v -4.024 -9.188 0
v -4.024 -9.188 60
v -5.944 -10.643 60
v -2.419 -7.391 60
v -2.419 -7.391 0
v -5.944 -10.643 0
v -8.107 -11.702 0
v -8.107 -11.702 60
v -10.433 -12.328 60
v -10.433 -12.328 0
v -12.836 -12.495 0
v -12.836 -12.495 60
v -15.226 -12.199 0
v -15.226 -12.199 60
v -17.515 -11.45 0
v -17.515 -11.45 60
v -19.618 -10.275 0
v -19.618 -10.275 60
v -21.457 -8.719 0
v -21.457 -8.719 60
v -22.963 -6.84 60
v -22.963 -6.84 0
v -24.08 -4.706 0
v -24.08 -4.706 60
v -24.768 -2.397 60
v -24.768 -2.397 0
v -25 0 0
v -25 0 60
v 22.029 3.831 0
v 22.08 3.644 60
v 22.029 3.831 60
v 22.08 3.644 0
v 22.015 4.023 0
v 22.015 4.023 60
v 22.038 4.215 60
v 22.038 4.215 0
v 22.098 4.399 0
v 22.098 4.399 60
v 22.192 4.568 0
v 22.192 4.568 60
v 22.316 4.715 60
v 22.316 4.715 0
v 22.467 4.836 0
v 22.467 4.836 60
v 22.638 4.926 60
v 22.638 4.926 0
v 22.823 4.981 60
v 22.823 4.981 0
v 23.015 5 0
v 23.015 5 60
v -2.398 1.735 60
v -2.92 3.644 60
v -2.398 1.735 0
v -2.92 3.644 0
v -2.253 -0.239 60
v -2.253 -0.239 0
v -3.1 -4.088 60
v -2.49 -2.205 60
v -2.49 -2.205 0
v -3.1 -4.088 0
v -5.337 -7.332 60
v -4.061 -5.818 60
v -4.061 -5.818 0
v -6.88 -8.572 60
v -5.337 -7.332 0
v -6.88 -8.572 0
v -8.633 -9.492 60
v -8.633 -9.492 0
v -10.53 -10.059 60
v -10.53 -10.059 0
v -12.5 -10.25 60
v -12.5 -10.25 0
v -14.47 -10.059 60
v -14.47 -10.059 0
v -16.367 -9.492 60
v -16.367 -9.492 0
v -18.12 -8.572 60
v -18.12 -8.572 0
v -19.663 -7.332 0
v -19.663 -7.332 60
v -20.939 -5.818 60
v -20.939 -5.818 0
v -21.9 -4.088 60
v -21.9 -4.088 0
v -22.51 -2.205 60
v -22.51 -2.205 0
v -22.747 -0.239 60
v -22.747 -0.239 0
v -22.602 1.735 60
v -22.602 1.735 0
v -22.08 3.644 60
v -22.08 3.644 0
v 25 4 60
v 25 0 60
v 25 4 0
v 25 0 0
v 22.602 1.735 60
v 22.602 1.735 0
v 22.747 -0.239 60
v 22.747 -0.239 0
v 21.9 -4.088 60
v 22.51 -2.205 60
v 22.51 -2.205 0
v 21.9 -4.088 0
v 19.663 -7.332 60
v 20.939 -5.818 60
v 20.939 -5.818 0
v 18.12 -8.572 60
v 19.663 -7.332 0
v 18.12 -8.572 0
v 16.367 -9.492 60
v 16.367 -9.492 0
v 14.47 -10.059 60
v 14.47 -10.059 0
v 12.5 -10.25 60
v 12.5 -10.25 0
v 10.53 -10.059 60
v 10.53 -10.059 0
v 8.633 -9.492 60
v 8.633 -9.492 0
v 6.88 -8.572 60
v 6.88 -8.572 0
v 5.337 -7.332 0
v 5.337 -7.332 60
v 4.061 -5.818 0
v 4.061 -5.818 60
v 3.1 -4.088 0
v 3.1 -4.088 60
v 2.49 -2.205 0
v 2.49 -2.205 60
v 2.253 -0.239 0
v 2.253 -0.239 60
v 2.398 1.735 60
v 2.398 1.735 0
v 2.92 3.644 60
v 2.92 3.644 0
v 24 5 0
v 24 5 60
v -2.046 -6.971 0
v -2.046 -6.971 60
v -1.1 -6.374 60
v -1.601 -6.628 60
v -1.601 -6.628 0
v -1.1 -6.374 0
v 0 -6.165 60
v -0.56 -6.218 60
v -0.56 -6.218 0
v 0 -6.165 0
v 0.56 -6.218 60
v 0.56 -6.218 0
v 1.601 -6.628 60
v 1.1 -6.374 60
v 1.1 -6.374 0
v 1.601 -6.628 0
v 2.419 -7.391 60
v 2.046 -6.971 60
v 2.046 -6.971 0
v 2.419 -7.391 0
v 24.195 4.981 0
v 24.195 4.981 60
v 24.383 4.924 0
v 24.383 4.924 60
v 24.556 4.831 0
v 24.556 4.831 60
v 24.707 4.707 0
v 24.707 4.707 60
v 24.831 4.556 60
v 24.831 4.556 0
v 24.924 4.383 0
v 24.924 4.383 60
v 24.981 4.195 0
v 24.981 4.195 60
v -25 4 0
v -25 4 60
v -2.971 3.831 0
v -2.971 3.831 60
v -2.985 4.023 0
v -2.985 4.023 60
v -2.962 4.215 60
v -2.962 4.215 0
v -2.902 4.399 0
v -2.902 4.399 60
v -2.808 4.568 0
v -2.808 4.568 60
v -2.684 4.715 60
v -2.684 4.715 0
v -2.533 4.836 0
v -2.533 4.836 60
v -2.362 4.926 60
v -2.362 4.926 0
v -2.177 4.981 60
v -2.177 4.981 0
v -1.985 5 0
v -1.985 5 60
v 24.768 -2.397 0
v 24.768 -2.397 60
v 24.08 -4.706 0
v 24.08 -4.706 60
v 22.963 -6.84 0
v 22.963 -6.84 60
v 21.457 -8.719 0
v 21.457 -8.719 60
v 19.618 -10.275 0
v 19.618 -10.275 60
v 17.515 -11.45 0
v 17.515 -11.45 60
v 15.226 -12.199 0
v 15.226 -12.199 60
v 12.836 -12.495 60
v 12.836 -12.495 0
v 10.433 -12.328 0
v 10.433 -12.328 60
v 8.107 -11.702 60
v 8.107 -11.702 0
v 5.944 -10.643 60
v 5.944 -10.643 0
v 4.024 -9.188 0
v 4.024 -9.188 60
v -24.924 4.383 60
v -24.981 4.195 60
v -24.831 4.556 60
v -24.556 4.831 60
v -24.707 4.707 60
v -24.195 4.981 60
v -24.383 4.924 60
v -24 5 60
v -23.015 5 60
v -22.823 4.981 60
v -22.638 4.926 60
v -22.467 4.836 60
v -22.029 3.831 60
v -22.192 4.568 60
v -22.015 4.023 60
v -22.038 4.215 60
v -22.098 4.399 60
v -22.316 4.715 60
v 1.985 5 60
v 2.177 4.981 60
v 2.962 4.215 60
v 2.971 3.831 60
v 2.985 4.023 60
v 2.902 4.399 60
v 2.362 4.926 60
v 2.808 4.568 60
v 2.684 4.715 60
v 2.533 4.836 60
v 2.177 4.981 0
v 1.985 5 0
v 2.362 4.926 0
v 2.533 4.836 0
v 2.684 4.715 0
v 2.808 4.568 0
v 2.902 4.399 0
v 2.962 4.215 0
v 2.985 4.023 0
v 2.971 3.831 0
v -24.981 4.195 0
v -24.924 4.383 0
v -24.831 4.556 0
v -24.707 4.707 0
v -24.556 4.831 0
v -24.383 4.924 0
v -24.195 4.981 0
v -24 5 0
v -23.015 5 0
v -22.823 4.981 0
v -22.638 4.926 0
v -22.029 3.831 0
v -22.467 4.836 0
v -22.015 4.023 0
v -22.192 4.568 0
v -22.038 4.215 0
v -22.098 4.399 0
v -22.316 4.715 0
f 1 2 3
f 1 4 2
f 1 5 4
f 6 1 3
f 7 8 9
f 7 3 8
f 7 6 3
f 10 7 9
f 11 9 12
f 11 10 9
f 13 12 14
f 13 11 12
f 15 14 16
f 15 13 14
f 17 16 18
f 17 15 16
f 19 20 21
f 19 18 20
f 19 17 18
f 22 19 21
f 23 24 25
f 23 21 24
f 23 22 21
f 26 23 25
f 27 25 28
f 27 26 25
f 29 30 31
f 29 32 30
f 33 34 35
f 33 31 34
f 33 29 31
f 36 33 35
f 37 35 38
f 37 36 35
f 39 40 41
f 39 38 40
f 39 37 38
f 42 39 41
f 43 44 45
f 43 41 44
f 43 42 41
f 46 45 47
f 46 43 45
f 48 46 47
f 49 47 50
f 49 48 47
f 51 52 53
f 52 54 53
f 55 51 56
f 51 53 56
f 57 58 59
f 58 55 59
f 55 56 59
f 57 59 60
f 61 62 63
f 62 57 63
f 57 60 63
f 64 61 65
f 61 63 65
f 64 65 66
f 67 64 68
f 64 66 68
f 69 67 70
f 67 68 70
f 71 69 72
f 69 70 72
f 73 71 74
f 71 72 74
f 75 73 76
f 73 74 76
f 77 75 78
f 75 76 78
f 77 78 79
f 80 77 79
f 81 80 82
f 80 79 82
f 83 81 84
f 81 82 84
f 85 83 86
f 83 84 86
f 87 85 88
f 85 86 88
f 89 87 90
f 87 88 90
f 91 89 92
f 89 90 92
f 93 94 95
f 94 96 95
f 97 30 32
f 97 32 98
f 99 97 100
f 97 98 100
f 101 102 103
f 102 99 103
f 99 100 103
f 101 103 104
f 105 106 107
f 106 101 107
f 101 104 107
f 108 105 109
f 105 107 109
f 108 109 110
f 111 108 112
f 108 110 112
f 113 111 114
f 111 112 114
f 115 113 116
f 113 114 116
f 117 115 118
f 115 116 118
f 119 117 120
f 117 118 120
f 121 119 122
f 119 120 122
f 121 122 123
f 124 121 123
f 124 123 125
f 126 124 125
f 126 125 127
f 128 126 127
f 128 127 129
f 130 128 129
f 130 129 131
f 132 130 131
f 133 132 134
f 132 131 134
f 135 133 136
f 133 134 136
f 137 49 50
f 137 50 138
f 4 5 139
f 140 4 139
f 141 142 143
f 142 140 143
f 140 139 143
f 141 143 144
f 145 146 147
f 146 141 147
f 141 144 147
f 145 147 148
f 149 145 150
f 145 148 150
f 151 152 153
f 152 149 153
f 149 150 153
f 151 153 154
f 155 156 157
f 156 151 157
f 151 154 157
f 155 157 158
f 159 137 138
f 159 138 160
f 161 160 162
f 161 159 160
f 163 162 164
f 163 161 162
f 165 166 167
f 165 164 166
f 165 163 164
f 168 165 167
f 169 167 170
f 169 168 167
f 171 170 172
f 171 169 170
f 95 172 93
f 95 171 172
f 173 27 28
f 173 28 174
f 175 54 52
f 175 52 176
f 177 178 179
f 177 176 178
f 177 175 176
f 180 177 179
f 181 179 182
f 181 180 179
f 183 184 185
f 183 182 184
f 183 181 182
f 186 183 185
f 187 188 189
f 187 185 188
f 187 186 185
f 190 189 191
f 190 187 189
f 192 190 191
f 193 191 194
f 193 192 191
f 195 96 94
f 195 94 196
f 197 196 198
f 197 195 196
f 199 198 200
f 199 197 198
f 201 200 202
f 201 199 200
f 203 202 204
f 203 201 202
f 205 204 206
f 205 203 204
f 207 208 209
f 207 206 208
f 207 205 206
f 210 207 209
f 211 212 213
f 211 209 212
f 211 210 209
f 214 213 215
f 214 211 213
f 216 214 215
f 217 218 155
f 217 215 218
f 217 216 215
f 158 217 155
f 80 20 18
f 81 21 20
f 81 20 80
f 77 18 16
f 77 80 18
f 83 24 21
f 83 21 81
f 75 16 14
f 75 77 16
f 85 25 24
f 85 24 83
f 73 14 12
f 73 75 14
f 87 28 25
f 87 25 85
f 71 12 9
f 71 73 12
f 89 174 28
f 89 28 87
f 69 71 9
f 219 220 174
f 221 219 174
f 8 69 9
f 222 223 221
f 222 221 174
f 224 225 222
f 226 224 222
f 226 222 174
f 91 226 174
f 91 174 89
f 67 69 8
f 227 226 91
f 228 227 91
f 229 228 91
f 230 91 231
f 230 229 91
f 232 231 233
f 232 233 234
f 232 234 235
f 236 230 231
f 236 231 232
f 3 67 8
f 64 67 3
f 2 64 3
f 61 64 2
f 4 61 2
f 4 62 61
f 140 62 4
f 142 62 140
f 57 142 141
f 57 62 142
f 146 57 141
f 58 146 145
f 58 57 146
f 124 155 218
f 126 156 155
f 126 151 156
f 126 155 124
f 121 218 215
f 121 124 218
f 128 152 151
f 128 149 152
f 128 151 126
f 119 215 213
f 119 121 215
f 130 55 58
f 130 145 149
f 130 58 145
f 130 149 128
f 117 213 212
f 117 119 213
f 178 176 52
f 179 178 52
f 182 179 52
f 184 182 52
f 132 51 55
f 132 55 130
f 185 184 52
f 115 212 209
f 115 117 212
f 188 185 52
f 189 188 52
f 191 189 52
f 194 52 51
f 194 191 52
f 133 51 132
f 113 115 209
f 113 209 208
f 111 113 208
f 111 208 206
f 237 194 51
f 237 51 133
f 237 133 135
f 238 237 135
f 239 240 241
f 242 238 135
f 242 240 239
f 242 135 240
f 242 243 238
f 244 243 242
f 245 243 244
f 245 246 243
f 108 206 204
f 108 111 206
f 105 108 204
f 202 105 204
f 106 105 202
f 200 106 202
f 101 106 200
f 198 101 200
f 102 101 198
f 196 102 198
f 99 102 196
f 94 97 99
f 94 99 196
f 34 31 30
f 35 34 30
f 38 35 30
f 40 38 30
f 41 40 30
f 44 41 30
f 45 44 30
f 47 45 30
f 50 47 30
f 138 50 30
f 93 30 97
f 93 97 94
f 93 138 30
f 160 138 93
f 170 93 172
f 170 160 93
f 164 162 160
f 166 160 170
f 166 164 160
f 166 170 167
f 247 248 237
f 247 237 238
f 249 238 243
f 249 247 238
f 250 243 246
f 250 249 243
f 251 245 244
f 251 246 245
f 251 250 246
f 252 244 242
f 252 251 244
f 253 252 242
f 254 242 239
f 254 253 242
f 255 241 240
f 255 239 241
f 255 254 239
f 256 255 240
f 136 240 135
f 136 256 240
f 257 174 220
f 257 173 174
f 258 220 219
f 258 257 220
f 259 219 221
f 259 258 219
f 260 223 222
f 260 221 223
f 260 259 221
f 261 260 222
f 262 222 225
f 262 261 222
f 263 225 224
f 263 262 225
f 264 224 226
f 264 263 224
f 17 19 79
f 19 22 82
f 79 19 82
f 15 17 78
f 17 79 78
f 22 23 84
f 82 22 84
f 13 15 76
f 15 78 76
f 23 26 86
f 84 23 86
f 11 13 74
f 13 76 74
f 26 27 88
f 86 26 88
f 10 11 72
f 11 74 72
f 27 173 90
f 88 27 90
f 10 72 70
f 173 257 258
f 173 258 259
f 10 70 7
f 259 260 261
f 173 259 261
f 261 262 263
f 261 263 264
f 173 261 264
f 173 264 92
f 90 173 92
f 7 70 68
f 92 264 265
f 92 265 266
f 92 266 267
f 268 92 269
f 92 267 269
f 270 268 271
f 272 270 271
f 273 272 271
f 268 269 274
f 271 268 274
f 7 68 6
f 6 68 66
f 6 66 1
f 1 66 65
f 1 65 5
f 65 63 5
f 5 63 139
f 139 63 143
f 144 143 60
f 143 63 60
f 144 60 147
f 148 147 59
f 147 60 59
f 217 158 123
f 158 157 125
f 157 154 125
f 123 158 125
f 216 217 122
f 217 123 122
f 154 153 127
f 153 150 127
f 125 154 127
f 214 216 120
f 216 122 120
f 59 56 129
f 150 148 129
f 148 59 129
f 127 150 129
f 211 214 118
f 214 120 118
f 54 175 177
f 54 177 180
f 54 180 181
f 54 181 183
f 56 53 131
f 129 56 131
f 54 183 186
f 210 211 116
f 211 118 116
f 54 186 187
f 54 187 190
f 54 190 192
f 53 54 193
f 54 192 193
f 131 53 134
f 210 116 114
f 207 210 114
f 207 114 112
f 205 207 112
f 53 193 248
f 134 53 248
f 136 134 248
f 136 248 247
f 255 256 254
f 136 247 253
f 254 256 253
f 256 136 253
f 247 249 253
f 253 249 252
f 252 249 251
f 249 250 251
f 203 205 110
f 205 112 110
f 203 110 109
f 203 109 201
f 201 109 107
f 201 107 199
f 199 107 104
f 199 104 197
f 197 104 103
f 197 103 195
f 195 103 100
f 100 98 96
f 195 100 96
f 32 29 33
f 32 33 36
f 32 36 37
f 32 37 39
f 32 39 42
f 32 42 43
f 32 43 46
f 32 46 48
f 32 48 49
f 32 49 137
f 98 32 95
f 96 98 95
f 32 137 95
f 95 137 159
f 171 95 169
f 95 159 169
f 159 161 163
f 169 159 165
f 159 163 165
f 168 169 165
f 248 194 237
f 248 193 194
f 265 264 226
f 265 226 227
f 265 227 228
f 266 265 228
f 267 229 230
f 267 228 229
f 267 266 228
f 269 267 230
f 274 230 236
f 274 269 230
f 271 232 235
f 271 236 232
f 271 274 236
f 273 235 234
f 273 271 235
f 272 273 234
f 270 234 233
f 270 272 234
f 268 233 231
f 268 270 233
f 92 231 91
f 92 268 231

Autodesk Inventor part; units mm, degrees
ref_plane "YZ Plane" through (0, 0, 0) normal (1, 0, 0) x (0, 1, 0)
ref_plane "XZ Plane" through (0, 0, 0) normal (0, 1, 0) x (-1, 0, 0)
ref_plane "XY Plane" through (0, 0, 0) normal (0, 0, 1) x (1, 0, 0)
sketch "Sketch1" plane through (0, 0, 0) normal (0, 0, 1) x (1, 0, 0)
  arc A0 (-25, 0) -> (0, 0) centre (-12.5, 0) ccw construction
  arc A1 (0, 0) -> (25, 0) centre (12.5, 0) ccw construction
  line L0 (-25, 0) -> (25, 0) construction
  line L1 (-25, 0) -> (-25, 4)
  line L2 (25, 0) -> (25, 4)
  arc A2 (-22.0802, 3.6444) -> (-2.9198, 3.6444) centre (-12.5, 0) ccw
  arc A3 (2.9198, 3.6444) -> (22.0802, 3.6444) centre (12.5, 0) ccw
  line L3 (-24, 5) -> (-23.0149, 5)
  line L4 (-1.9851, 5) -> (1.9851, 5)
  line L5 (23.0149, 5) -> (24, 5)
  arc A4 (2.4194, -7.3913) -> (-2.4194, -7.3913) centre (0, -9.1652) ccw
  arc A5 (-22.0802, 3.6444) -> (-23.0149, 5) centre (-23.0149, 4) ccw
  arc A6 (-24, 5) -> (-25, 4) centre (-24, 4) ccw
  arc A7 (-1.9851, 5) -> (-2.9198, 3.6444) centre (-1.9851, 4) ccw
  arc A8 (2.9198, 3.6444) -> (1.9851, 5) centre (1.9851, 4) ccw
  arc A9 (23.0149, 5) -> (22.0802, 3.6444) centre (23.0149, 4) ccw
  arc A10 (25, 4) -> (24, 5) centre (24, 4) ccw
  arc A11 (-25, 0) -> (-2.4194, -7.3913) centre (-12.5, 0) ccw
  arc A12 (2.4194, -7.3913) -> (25, 0) centre (12.5, 0) ccw
  line L6 (-24, 5) -> (-23.0149, 5)
  point P0 (25, 5)
  point P1 (-3.5522, 5)
  point P2 (3.5522, 5)
  point P3 (21.4478, 5)
  dimension "d0" = 12.5
  dimension "d2" = 12.5
  dimension "d3" = 5
  dimension "d5" = 10.25
  dimension "d6" = 10.25
  dimension "d9" = 3
  dimension "d10" = 1
  dimension "d11" = 1
extrude "Extrusion2" add sketch "Sketch1" along normal blind 60
equation "\"d2\" = d0"
equation "\"d6\" = d5"
properties part number "spool holder"
